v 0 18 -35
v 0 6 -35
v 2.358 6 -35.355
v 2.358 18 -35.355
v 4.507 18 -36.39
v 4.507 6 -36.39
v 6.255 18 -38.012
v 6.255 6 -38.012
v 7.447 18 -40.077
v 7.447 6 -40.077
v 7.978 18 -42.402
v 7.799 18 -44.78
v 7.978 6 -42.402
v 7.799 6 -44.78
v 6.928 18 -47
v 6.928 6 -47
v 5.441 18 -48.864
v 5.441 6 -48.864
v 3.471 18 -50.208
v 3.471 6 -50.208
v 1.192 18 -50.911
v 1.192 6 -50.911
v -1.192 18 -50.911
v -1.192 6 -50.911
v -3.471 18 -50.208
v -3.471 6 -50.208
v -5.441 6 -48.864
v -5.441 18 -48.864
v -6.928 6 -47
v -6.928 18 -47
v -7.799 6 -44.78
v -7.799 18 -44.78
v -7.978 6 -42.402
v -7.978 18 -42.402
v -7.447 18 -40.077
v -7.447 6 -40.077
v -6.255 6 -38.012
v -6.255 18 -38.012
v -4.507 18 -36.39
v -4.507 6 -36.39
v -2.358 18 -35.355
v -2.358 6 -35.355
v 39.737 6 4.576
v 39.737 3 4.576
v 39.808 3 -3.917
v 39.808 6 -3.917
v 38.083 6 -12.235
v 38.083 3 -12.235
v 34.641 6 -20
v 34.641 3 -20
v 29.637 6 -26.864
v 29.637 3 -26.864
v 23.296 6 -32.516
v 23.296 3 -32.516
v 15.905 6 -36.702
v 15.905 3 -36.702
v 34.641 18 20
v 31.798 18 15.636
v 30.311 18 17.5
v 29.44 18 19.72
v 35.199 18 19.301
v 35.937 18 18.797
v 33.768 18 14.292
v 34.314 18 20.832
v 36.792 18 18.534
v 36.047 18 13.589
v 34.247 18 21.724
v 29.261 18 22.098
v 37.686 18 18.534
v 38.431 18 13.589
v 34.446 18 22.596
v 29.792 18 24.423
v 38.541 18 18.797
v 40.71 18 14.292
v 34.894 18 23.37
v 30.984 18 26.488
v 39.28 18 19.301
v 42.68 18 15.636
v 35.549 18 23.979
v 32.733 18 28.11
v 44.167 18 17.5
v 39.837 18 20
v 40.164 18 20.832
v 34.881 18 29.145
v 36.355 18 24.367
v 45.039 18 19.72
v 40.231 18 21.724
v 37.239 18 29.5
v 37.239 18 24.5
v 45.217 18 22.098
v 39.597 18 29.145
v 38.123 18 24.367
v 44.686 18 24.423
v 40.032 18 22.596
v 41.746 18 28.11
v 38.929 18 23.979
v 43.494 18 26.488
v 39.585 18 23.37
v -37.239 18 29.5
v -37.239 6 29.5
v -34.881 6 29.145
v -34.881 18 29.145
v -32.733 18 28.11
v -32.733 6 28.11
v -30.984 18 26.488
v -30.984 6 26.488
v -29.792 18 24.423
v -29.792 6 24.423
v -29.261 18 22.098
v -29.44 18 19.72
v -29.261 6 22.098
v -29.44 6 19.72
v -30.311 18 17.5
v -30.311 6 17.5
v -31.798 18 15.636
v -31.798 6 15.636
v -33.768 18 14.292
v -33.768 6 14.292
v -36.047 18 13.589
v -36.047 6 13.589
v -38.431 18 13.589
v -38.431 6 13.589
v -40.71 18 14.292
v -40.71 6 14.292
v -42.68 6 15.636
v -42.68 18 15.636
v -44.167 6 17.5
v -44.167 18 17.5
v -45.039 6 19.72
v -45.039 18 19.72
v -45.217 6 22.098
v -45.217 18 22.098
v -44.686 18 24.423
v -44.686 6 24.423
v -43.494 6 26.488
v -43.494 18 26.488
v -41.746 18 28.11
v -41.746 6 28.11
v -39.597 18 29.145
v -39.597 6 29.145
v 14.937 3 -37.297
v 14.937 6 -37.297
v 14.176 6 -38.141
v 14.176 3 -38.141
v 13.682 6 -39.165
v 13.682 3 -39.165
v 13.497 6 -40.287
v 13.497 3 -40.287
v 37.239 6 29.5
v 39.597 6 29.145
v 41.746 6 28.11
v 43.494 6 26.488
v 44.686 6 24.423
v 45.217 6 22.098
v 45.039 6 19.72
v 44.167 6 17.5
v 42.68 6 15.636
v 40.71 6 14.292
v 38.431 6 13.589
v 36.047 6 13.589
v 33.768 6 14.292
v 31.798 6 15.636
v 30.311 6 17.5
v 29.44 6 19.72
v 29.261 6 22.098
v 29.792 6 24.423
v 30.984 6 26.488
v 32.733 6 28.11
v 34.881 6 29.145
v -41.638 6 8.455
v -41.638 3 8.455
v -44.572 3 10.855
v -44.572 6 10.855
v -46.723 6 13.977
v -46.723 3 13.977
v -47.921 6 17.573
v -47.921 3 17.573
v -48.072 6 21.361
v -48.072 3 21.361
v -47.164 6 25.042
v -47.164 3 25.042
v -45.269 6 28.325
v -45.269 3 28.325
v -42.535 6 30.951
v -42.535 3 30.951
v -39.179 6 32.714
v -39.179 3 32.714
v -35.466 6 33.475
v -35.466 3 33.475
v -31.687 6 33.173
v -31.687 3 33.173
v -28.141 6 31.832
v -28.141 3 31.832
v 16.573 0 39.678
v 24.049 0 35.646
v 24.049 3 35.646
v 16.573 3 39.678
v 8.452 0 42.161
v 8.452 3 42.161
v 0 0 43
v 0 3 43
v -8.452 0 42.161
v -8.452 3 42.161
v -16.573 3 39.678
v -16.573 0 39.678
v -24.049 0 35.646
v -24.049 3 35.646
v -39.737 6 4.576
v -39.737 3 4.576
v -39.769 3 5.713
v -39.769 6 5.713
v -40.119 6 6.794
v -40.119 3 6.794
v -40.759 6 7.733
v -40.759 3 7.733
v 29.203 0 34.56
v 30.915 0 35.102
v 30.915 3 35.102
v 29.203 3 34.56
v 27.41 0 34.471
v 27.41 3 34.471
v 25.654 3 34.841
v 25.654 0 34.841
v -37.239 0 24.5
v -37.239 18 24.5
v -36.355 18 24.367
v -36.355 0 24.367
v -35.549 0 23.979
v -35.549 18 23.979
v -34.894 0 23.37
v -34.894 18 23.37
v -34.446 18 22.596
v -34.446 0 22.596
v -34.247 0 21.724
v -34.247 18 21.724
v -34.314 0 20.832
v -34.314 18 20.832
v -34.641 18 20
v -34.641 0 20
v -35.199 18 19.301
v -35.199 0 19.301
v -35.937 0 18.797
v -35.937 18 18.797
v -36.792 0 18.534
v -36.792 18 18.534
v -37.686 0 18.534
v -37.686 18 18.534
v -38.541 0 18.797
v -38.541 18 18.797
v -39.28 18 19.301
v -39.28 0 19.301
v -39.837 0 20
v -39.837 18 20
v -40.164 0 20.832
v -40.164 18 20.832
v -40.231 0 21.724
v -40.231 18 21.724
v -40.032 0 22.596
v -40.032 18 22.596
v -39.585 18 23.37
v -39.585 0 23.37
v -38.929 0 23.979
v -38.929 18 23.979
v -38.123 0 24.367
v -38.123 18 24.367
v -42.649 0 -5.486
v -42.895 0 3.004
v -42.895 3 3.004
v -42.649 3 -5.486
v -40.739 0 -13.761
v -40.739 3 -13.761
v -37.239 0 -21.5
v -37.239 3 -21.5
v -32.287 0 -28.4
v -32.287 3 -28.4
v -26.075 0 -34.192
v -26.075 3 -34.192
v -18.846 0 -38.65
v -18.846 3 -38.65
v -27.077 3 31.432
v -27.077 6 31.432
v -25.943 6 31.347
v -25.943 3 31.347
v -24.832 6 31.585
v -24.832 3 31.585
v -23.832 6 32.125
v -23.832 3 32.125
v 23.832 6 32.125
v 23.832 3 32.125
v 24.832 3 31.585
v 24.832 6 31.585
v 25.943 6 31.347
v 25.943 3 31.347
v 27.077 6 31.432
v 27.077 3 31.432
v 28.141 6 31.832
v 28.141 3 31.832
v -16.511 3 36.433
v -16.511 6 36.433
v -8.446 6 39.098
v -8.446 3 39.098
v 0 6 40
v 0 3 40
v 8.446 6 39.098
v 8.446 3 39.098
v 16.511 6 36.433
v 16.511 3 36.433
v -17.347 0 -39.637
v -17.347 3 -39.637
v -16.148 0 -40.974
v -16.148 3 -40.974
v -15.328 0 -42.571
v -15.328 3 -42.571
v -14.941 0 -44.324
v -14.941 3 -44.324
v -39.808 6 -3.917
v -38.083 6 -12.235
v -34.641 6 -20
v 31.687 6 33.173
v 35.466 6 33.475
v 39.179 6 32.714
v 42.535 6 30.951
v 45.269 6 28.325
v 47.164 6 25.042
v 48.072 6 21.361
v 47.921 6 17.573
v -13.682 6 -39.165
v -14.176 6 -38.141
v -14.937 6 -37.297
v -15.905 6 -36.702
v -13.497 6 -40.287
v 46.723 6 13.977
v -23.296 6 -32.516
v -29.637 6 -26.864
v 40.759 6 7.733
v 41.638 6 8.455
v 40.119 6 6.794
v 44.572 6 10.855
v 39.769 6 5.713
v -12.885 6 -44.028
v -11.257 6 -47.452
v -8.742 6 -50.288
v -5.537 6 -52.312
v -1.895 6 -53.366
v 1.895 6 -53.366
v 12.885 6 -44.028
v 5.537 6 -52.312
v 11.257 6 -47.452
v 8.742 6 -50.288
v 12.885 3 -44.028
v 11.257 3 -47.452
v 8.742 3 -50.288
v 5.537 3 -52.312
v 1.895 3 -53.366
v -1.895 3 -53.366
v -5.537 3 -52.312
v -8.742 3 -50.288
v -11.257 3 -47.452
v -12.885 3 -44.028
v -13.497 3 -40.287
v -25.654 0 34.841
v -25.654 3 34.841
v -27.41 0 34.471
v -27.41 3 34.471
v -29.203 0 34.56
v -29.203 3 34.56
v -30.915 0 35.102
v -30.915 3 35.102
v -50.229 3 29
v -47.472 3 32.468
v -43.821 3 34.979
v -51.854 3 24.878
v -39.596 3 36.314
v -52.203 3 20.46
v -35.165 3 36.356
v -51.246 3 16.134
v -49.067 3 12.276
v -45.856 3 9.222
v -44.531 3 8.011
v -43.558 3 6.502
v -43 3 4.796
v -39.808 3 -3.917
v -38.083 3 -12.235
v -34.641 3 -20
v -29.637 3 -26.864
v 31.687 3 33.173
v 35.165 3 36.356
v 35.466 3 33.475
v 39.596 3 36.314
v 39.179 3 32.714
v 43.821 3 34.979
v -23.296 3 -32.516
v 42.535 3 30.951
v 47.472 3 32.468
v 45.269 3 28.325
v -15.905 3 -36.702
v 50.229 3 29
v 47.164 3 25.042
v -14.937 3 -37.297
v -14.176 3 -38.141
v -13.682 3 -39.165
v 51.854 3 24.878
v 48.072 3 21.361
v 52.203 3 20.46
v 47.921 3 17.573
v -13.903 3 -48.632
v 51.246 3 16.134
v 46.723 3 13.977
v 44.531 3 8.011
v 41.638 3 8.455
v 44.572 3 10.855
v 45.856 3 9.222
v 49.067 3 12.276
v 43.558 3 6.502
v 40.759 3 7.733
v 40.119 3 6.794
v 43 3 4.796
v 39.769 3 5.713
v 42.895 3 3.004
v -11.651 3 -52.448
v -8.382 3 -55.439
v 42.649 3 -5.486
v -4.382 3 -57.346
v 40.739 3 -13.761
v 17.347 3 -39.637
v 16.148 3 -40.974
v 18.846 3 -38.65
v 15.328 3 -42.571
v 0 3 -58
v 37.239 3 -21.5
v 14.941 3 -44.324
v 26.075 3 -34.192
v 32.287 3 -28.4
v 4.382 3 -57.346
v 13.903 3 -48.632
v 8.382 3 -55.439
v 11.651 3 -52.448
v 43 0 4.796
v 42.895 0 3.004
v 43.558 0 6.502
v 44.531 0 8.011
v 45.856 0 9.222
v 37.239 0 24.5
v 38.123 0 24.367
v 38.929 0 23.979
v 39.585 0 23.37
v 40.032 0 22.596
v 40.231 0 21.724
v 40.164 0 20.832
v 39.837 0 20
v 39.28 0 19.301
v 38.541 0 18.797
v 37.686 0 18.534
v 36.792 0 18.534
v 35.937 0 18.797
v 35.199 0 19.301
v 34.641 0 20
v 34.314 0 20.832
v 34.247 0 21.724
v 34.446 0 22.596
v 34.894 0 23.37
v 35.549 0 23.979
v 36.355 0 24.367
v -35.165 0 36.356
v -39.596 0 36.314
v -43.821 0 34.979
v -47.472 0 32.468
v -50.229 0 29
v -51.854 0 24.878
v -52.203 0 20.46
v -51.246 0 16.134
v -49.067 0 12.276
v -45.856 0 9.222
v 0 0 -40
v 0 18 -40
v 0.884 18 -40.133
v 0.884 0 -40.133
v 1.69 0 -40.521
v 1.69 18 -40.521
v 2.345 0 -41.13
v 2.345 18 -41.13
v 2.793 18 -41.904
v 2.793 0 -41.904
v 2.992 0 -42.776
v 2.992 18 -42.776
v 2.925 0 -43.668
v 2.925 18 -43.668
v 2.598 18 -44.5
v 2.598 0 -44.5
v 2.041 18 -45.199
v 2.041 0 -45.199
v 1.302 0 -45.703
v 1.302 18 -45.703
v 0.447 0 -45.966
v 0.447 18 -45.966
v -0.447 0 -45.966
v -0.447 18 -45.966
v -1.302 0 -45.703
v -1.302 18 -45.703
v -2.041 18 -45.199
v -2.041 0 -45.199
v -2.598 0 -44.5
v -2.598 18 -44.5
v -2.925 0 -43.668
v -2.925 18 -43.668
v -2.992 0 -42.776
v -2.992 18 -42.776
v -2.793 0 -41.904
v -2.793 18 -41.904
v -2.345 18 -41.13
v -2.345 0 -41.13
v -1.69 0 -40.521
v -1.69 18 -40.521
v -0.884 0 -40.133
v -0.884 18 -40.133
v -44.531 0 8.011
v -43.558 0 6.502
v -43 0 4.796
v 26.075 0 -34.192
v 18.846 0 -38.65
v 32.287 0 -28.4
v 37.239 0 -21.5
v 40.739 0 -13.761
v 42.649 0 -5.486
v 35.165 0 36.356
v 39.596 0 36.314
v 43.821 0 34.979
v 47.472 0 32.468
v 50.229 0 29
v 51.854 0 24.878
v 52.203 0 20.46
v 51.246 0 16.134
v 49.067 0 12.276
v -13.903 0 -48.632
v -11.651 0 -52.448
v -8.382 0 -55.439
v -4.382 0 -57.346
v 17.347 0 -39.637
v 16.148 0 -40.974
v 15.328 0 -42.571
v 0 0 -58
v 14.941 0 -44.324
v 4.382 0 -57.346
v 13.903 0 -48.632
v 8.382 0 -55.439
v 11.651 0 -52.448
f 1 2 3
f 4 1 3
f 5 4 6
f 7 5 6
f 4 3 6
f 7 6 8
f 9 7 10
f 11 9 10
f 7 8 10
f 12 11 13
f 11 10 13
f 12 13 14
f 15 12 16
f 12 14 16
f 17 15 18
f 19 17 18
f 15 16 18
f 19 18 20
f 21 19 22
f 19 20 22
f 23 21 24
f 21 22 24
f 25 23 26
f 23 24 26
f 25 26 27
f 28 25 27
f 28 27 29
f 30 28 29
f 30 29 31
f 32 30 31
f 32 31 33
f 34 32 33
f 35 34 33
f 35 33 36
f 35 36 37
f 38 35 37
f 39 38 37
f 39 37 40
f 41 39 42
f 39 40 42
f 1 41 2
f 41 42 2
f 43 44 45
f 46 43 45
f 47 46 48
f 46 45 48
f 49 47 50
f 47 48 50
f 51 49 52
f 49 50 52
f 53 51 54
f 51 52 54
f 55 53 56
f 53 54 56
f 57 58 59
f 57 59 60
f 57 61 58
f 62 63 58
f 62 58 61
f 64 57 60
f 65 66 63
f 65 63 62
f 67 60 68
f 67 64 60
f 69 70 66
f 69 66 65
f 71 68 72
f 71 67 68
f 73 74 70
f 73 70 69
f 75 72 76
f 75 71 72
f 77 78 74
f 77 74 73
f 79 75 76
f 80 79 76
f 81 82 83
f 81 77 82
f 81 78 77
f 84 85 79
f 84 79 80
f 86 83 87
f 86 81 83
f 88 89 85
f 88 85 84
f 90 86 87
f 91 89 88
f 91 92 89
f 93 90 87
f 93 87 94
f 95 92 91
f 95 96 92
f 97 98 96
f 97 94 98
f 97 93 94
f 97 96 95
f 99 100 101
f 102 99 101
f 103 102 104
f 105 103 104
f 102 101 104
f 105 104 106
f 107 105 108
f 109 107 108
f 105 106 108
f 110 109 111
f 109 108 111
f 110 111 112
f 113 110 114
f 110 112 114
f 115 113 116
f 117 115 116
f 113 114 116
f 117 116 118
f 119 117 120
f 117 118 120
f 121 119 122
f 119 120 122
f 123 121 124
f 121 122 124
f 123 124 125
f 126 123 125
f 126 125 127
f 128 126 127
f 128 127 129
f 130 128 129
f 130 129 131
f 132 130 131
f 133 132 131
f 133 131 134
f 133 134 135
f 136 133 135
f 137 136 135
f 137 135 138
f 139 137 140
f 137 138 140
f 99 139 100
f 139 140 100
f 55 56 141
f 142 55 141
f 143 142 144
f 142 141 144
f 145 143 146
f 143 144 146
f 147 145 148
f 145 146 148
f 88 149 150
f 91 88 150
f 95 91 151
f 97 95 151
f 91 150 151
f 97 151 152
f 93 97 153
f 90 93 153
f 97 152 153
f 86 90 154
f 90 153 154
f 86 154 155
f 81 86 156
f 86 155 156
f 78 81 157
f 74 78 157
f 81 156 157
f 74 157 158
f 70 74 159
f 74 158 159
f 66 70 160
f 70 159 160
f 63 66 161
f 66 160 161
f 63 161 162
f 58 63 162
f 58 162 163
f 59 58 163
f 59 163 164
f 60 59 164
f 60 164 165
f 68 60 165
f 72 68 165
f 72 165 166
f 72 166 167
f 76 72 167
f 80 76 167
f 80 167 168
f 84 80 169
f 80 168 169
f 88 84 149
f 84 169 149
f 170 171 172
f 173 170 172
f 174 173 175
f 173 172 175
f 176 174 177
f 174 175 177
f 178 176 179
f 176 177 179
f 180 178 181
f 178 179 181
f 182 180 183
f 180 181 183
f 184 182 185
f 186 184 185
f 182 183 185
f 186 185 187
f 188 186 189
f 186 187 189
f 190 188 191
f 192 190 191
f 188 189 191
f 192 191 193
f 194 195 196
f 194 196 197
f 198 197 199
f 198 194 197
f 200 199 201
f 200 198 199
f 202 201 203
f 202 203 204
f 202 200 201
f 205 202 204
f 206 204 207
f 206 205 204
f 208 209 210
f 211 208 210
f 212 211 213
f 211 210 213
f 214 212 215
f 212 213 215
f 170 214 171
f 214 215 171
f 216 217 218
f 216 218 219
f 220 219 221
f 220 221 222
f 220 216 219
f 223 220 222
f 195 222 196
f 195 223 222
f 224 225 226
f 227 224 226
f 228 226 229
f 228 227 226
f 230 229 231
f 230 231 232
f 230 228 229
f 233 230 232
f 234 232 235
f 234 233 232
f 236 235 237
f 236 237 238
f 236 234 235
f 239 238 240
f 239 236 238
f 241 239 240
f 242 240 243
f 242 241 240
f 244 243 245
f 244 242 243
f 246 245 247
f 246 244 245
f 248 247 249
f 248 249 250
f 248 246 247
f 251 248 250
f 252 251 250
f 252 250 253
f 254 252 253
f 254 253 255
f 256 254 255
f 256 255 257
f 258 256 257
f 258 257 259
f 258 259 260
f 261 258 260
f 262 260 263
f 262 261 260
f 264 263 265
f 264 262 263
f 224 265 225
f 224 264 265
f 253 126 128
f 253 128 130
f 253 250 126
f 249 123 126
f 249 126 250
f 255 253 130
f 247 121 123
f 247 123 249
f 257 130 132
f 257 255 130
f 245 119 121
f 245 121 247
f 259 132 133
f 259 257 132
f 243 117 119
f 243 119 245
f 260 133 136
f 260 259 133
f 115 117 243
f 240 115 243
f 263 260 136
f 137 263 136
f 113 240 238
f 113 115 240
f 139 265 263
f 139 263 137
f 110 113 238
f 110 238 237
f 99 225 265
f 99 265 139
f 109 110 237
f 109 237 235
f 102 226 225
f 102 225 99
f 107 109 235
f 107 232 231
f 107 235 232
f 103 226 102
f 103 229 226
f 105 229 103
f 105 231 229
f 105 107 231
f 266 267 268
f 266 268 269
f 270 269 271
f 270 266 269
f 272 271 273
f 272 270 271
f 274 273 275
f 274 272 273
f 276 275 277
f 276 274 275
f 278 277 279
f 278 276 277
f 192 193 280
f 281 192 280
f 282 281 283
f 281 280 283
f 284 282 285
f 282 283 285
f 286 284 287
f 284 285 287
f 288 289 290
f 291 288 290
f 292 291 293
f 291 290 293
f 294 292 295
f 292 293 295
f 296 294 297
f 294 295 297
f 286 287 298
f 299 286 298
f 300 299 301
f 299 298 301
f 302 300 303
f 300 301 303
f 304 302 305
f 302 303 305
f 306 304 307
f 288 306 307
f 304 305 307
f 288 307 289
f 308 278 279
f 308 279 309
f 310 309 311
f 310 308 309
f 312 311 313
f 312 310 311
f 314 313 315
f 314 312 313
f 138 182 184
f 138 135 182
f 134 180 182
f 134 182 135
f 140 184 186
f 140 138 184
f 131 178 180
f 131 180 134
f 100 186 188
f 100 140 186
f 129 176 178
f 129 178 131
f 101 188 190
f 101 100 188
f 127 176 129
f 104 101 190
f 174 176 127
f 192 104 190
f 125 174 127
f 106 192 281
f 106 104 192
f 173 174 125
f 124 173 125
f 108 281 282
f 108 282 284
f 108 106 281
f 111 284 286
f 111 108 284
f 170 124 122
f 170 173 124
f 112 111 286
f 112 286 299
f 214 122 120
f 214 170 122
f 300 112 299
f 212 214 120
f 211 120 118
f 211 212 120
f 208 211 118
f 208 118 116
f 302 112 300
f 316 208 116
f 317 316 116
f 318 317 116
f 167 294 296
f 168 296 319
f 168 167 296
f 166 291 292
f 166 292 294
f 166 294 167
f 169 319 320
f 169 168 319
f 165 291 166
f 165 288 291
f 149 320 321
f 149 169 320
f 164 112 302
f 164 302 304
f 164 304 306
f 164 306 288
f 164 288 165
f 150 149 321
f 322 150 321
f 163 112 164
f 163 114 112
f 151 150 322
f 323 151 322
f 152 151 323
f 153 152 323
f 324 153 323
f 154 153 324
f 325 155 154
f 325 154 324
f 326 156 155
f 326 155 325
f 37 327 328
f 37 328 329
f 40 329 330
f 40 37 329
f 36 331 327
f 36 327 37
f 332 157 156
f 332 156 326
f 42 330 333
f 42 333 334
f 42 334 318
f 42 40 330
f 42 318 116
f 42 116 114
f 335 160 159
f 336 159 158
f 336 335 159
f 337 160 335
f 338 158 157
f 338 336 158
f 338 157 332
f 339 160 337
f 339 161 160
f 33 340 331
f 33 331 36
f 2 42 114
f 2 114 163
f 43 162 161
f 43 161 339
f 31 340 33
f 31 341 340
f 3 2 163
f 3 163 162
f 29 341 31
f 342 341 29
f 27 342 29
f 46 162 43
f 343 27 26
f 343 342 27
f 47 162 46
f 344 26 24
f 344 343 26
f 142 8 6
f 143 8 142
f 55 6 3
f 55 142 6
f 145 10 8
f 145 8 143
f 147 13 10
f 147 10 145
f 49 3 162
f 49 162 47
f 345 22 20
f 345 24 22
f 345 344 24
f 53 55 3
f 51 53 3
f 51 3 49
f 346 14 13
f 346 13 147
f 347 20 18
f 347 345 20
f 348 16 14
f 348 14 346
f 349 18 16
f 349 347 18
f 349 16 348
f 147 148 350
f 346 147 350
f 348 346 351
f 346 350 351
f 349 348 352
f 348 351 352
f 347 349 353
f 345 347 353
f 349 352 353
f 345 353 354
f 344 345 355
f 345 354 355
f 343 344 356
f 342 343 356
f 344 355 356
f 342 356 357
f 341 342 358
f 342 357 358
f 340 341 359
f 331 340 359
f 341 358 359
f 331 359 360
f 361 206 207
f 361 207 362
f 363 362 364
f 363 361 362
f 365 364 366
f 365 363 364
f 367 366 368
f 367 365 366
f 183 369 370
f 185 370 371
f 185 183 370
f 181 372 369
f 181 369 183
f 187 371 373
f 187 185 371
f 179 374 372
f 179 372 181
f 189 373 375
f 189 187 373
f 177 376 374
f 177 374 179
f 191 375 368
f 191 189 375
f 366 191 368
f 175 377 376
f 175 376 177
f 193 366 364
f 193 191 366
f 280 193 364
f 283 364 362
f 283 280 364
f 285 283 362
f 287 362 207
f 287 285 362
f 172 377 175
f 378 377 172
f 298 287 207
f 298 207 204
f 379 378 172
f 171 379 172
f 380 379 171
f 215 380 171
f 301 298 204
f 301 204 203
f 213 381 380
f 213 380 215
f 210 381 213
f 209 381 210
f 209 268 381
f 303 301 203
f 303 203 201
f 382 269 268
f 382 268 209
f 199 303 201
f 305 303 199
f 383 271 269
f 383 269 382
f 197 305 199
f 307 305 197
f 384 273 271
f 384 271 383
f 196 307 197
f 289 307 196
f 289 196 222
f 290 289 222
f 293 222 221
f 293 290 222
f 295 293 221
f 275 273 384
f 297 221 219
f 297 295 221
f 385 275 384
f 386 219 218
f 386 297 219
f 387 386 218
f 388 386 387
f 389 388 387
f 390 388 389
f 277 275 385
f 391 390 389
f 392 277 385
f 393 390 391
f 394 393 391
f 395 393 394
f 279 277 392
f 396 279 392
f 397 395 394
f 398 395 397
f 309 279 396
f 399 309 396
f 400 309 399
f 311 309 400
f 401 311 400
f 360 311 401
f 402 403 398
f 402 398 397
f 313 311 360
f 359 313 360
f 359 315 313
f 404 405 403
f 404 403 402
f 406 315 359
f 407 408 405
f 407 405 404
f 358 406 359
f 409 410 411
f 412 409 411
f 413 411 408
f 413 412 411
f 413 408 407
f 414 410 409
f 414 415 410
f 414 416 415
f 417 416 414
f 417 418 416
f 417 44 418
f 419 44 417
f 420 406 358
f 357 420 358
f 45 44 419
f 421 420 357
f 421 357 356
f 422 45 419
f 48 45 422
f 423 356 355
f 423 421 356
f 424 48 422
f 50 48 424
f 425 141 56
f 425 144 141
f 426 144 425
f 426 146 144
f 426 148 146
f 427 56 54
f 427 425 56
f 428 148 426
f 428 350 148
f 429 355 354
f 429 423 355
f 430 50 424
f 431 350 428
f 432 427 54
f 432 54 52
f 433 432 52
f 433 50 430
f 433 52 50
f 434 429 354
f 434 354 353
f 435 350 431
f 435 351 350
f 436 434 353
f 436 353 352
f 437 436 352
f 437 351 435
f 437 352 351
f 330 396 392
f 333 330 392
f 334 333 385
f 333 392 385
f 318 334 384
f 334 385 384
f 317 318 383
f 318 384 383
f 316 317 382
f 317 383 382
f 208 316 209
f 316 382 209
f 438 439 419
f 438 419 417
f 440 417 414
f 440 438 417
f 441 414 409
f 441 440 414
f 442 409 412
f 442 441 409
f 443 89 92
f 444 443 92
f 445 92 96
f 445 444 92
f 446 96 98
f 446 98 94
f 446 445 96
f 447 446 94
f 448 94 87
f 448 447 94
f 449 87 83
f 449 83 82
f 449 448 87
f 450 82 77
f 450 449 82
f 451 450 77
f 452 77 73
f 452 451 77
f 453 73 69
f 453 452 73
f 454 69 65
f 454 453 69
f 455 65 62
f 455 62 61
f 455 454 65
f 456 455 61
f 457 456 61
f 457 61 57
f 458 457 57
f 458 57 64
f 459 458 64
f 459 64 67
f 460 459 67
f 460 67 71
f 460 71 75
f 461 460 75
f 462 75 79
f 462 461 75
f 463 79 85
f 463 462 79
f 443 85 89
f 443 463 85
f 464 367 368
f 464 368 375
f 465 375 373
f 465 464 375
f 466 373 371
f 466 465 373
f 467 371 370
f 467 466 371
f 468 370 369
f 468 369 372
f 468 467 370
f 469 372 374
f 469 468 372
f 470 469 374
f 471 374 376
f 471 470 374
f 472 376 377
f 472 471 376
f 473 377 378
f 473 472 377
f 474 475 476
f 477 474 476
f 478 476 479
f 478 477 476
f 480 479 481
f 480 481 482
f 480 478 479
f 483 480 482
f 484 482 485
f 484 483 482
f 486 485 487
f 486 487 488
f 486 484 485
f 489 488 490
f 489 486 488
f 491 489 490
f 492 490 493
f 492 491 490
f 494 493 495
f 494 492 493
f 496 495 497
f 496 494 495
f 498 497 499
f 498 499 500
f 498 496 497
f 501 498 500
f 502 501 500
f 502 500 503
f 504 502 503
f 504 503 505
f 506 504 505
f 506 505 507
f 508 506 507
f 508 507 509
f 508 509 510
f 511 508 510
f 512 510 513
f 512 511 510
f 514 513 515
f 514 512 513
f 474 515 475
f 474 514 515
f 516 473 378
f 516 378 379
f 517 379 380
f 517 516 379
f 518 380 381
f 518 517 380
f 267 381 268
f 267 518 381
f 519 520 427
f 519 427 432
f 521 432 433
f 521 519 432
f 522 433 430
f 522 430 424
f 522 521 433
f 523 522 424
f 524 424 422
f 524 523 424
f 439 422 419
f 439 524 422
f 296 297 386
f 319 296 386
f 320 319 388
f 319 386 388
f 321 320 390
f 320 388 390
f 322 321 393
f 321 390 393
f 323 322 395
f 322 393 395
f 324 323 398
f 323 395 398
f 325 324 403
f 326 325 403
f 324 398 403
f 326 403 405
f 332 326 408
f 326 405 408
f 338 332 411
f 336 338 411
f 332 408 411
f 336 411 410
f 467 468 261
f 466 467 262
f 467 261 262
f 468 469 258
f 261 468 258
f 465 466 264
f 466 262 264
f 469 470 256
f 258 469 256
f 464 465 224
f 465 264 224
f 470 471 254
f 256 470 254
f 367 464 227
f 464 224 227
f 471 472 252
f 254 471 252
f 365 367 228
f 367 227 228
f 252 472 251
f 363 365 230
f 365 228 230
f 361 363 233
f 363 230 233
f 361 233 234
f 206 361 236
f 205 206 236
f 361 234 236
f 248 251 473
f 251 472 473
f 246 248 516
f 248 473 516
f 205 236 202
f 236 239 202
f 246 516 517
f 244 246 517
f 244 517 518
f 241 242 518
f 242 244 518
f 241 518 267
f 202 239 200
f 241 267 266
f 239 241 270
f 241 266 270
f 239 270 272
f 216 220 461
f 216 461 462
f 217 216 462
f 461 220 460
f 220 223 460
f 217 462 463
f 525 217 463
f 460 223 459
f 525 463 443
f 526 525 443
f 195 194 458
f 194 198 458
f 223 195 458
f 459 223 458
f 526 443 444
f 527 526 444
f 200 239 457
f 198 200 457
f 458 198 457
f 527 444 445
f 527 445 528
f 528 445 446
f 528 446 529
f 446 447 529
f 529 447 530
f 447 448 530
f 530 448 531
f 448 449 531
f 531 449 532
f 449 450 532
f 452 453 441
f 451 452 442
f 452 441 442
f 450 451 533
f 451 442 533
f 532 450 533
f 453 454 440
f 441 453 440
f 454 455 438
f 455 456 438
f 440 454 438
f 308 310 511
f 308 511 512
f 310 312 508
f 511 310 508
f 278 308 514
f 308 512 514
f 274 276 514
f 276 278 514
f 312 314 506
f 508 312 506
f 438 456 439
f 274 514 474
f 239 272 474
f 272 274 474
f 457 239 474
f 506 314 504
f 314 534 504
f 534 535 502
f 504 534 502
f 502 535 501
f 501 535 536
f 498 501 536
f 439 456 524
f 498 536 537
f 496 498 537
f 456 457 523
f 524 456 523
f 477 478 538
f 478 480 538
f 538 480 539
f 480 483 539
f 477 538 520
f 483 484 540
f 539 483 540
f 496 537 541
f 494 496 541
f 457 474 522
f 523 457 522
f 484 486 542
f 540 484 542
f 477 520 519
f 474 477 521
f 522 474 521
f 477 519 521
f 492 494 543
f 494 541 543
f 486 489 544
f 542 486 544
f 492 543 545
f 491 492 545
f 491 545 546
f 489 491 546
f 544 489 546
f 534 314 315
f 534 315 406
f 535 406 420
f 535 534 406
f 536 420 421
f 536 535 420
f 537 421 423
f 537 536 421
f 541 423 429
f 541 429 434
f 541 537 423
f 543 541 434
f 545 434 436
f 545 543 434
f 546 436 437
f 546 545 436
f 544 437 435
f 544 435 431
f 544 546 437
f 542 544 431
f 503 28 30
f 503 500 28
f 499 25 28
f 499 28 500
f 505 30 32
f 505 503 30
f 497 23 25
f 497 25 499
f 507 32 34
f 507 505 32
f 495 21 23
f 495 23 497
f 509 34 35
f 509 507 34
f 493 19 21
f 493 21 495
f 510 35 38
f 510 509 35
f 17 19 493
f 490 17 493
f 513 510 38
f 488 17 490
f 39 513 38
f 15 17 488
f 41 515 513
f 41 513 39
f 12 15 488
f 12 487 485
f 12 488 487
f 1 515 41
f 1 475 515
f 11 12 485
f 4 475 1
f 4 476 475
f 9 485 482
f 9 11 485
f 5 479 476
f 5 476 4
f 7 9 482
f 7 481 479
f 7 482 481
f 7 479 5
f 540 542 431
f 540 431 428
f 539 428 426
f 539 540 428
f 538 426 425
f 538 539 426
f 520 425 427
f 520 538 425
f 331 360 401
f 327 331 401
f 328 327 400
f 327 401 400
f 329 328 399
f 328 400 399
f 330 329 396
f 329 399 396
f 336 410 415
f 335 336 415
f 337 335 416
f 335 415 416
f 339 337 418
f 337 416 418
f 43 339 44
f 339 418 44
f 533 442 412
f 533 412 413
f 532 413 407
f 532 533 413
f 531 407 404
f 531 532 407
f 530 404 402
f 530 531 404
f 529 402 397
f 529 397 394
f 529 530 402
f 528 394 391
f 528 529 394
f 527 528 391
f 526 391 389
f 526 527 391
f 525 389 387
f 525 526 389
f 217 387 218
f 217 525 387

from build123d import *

# Parameters (mm, degrees)
SKETCH1_R           = 6
SKETCH1_R_2         = 3
BOSS_EXTRUDE1_DEPTH = 3
SKETCH3_R           = 3
BOSS_EXTRUDE3_DEPTH = 3
SKETCH4_R           = 8
SKETCH4_R_2         = 3
BOSS_EXTRUDE4_DEPTH = 12
SKETCH6_R           = 8
SKETCH6_R_2         = 3
BOSS_EXTRUDE5_DEPTH = 12


with BuildPart() as part:
    # Sketch1 → Boss-Extrude1 (new body)
    # profile 1 of 4: a face of its own
    with BuildSketch(Plane(origin=(0, 0, 0), x_dir=(1, 0, 0), z_dir=(0, 1, 0))):
        with BuildLine():
            ThreePointArc((42.894958583, -3.003752345), (43.557934635, -6.502479184), (45.856433127, -9.222319513))
            ThreePointArc((45.856433127, -9.222319513), (50.229473419, -29), (30.914979544, -35.101676259))
            ThreePointArc((30.914979544, -35.101676259), (27.410279478, -34.471038339), (24.048805129, -35.646247655))
            ThreePointArc((24.048805129, -35.646247655), (0, -43), (-24.048805129, -35.646247655))
            ThreePointArc((-24.048805129, -35.646247655), (-27.410279478, -34.471038339), (-30.914979544, -35.101676259))
            ThreePointArc((-30.914979544, -35.101676259), (-50.229473419, -29), (-45.856433127, -9.222319513))
            ThreePointArc((-45.856433127, -9.222319513), (-43.557934635, -6.502479184), (-42.894958583, -3.003752345))
            ThreePointArc((-42.894958583, -3.003752345), (-37.239092363, 21.5), (-18.846153454, 38.65))
            ThreePointArc((-18.846153454, 38.65), (-16.147655157, 40.973517523), (-14.941453584, 44.323995772))
            ThreePointArc((-14.941453584, 44.323995772), (0, 58), (14.941453584, 44.323995772))
            ThreePointArc((14.941453584, 44.323995772), (16.147655157, 40.973517523), (18.846153454, 38.65))
            ThreePointArc((18.846153454, 38.65), (37.239092363, 21.5), (42.894958583, -3.003752345))
        make_face()
        with Locations((37.239092363, -21.5)):
            Circle(SKETCH1_R, mode=Mode.SUBTRACT)
        with Locations((-37.239092363, -21.5)):
            Circle(SKETCH1_R, mode=Mode.SUBTRACT)
        with Locations((0, 43)):
            Circle(SKETCH1_R, mode=Mode.SUBTRACT)
    # profile 2 of 4: a face of its own
    with BuildSketch(Plane(origin=(0, 0, 0), x_dir=(1, 0, 0), z_dir=(0, 1, 0))):
        with Locations((-37.239092363, -21.5)):
            Circle(SKETCH1_R)
        with Locations(Location((-37.239092363, -21.5, 0), (0, 0, 270))):
            Circle(SKETCH1_R_2, mode=Mode.SUBTRACT)
    # profile 3 of 4: a face of its own
    with BuildSketch(Plane(origin=(0, 0, 0), x_dir=(1, 0, 0), z_dir=(0, 1, 0))):
        with Locations((37.239092363, -21.5)):
            Circle(SKETCH1_R)
        with Locations(Location((37.239092363, -21.5, 0), (0, 0, 270))):
            Circle(SKETCH1_R_2, mode=Mode.SUBTRACT)
    # profile 4 of 4: a face of its own
    with BuildSketch(Plane(origin=(0, 0, 0), x_dir=(1, 0, 0), z_dir=(0, 1, 0))):
        with Locations((0, 43)):
            Circle(SKETCH1_R)
        with Locations(Location((0, 43, 0), (0, 0, 270))):
            Circle(SKETCH1_R_2, mode=Mode.SUBTRACT)
    extrude(amount=BOSS_EXTRUDE1_DEPTH)

    # Sketch3 → Boss-Extrude3 (add)
    with BuildSketch(Plane(origin=(0, 3, 0), x_dir=(1, 0, 0), z_dir=(0, 1, 0))):
        with BuildLine():
            ThreePointArc((13.496951609, 40.286875), (0, 53.5), (-13.496951609, 40.286875))
            ThreePointArc((-13.496951609, 40.286875), (-14.175747319, 38.14126951), (-15.905498529, 36.701704545))
            ThreePointArc((-15.905498529, 36.701704545), (-34.641016151, 20), (-39.737357763, -4.576286487))
            ThreePointArc((-39.737357763, -4.576286487), (-40.119181988, -6.794077459), (-41.637932994, -8.454734533))
            ThreePointArc((-41.637932994, -8.454734533), (-46.332359102, -26.75), (-28.140981385, -31.832140467))
            ThreePointArc((-28.140981385, -31.832140467), (-25.943434669, -31.347192051), (-23.831859234, -32.125418059))
            ThreePointArc((-23.831859234, -32.125418059), (0, -40), (23.831859234, -32.125418059))
            ThreePointArc((23.831859234, -32.125418059), (25.943434669, -31.347192051), (28.140981385, -31.832140467))
            ThreePointArc((28.140981385, -31.832140467), (46.332359102, -26.75), (41.637932994, -8.454734533))
            ThreePointArc((41.637932994, -8.454734533), (40.119181988, -6.794077459), (39.737357763, -4.576286487))
            ThreePointArc((39.737357763, -4.576286487), (34.641016151, 20), (15.905498529, 36.701704545))
            ThreePointArc((15.905498529, 36.701704545), (14.175747319, 38.14126951), (13.496951609, 40.286875))
        make_face()
        with Locations(Location((0, 43, 0), (0, 0, 270))):
            Circle(SKETCH3_R, mode=Mode.SUBTRACT)
        with Locations(Location((-37.239092363, -21.5, 0), (0, 0, 270))):
            Circle(SKETCH3_R, mode=Mode.SUBTRACT)
        with Locations(Location((37.239092363, -21.5, 0), (0, 0, 270))):
            Circle(SKETCH3_R, mode=Mode.SUBTRACT)
    extrude(amount=BOSS_EXTRUDE3_DEPTH)

    # Sketch4 → Boss-Extrude4 (add)
    with BuildSketch(Plane(origin=(0, 6, 0), x_dir=(1, 0, 0), z_dir=(0, 1, 0))):
        with Locations(Location((0, 43, 0), (0, 0, 270))):
            Circle(SKETCH4_R)
        with Locations(Location((0, 43, 0), (0, 0, 270))):
            Circle(SKETCH4_R_2, mode=Mode.SUBTRACT)
    extrude(amount=BOSS_EXTRUDE4_DEPTH)

    # Sketch6 → Boss-Extrude5 (add)
    # profile 1 of 2: a face of its own
    with BuildSketch(Plane(origin=(0, 6, 0), x_dir=(1, 0, 0), z_dir=(0, 1, 0))):
        with Locations(Location((-37.239092363, -21.5, 0), (0, 0, 270))):
            Circle(SKETCH6_R)
        with Locations(Location((-37.239092363, -21.5, 0), (0, 0, 270))):
            Circle(SKETCH6_R_2, mode=Mode.SUBTRACT)
    # profile 2 of 2: a face of its own
    with BuildSketch(Plane(origin=(0, 6, 0), x_dir=(1, 0, 0), z_dir=(0, 1, 0))):
        with Locations(Location((37.239092363, -21.5, 0), (0, 0, 270))):
            Circle(SKETCH6_R)
        with Locations(Location((37.239092363, -21.5, 0), (0, 0, 270))):
            Circle(SKETCH6_R_2, mode=Mode.SUBTRACT)
    extrude(amount=BOSS_EXTRUDE5_DEPTH)


solid = part.part
